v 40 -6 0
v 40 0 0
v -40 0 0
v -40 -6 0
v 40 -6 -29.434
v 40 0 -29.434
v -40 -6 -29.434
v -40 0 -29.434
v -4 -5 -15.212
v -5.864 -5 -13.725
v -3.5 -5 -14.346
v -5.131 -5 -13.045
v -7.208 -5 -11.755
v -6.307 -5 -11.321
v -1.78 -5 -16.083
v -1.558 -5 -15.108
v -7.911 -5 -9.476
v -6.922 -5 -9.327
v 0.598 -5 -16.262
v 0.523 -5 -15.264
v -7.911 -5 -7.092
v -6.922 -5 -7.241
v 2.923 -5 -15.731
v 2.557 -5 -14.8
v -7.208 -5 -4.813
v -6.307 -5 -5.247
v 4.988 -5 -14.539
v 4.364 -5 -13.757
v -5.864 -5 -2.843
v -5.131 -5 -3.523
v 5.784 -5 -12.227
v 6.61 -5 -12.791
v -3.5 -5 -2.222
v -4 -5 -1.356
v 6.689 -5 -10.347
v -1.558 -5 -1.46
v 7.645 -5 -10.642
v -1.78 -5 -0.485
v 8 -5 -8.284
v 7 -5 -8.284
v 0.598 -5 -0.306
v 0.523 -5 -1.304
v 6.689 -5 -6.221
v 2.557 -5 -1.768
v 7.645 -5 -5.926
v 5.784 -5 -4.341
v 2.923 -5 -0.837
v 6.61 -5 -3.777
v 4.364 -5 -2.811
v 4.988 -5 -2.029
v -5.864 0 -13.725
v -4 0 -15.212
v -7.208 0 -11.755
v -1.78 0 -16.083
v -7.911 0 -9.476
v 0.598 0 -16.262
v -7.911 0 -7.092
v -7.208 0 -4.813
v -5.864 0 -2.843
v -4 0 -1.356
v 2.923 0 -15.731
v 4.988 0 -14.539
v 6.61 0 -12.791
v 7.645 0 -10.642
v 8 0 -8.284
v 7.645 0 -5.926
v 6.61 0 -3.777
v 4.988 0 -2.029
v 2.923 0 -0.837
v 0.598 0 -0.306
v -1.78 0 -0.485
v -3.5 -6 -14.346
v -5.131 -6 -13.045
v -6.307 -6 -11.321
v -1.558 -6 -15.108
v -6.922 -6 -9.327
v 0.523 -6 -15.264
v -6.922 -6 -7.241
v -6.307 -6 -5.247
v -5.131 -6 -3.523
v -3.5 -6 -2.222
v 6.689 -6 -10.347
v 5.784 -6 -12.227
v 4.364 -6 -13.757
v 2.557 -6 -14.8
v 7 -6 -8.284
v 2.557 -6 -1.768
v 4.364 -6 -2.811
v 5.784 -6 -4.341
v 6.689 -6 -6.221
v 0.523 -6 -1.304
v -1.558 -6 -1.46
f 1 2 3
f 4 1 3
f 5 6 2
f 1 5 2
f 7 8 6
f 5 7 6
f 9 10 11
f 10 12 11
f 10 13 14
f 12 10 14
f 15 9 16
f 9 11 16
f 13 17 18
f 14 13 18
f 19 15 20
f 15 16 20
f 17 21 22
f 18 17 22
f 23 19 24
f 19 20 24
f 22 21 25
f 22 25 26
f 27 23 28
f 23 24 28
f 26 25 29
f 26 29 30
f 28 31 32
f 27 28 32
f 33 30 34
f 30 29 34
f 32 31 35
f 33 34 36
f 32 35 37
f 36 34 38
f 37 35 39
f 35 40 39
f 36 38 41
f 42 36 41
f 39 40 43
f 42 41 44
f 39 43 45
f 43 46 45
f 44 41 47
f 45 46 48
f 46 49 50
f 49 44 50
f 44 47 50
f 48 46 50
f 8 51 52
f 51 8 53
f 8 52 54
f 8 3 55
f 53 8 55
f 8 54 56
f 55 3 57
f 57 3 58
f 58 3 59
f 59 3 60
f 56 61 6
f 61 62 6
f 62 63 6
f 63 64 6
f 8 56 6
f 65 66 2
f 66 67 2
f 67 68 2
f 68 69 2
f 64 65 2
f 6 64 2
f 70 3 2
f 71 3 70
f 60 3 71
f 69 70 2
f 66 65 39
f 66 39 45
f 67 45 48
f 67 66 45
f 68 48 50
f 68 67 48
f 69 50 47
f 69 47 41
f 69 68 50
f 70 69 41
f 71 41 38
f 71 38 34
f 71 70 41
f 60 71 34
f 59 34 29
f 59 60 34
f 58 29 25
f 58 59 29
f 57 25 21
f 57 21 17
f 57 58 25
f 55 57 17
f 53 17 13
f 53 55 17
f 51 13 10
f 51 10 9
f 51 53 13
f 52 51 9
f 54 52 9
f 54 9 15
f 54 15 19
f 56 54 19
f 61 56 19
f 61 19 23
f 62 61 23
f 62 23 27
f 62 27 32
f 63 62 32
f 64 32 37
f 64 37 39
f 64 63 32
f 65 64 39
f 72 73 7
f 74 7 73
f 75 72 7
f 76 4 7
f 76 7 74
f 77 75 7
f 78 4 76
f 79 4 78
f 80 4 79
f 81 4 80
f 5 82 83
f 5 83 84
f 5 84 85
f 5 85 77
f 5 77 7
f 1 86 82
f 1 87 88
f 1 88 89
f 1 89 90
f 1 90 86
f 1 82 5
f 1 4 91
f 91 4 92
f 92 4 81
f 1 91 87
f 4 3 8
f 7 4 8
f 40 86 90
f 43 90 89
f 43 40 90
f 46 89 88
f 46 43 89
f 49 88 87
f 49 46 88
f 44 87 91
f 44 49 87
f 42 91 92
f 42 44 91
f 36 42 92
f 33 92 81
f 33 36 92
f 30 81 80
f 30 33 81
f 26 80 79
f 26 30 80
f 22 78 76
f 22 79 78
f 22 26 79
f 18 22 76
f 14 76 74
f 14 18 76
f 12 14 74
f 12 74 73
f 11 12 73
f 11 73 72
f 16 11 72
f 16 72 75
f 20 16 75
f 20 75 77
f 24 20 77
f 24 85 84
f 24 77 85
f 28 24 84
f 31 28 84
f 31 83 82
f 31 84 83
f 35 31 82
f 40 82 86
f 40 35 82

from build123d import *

# Parameters (mm, degrees)
F1_DEPTH = 6
F2_R     = 8
F2_R_2   = 7
F3_DEPTH = 5
F4_DEPTH = 26.3


with BuildPart() as f1:
    # F0 (on Front) → F1 (new body)
    with BuildSketch(Plane.XZ):
        Polygon((40, 0), (0, 0), (-40, 0), (-40, -29.434), (0, -29.434), (40, -29.434), align=None)
    extrude(amount=F1_DEPTH)

    # F2 (on face) → F3 (cut)
    with BuildSketch(Plane.XZ):
        with Locations((0, -8.284)):
            Circle(F2_R)
        with Locations((0, -8.284)):
            Circle(F2_R_2, mode=Mode.SUBTRACT)
    extrude(amount=F3_DEPTH, mode=Mode.SUBTRACT)

    # F2 (on face) → F4 (cut)
    with BuildSketch(Plane.XZ):
        with Locations((0, -8.284)):
            Circle(F2_R_2)
    extrude(amount=F4_DEPTH, mode=Mode.SUBTRACT)


solid = f1.part
